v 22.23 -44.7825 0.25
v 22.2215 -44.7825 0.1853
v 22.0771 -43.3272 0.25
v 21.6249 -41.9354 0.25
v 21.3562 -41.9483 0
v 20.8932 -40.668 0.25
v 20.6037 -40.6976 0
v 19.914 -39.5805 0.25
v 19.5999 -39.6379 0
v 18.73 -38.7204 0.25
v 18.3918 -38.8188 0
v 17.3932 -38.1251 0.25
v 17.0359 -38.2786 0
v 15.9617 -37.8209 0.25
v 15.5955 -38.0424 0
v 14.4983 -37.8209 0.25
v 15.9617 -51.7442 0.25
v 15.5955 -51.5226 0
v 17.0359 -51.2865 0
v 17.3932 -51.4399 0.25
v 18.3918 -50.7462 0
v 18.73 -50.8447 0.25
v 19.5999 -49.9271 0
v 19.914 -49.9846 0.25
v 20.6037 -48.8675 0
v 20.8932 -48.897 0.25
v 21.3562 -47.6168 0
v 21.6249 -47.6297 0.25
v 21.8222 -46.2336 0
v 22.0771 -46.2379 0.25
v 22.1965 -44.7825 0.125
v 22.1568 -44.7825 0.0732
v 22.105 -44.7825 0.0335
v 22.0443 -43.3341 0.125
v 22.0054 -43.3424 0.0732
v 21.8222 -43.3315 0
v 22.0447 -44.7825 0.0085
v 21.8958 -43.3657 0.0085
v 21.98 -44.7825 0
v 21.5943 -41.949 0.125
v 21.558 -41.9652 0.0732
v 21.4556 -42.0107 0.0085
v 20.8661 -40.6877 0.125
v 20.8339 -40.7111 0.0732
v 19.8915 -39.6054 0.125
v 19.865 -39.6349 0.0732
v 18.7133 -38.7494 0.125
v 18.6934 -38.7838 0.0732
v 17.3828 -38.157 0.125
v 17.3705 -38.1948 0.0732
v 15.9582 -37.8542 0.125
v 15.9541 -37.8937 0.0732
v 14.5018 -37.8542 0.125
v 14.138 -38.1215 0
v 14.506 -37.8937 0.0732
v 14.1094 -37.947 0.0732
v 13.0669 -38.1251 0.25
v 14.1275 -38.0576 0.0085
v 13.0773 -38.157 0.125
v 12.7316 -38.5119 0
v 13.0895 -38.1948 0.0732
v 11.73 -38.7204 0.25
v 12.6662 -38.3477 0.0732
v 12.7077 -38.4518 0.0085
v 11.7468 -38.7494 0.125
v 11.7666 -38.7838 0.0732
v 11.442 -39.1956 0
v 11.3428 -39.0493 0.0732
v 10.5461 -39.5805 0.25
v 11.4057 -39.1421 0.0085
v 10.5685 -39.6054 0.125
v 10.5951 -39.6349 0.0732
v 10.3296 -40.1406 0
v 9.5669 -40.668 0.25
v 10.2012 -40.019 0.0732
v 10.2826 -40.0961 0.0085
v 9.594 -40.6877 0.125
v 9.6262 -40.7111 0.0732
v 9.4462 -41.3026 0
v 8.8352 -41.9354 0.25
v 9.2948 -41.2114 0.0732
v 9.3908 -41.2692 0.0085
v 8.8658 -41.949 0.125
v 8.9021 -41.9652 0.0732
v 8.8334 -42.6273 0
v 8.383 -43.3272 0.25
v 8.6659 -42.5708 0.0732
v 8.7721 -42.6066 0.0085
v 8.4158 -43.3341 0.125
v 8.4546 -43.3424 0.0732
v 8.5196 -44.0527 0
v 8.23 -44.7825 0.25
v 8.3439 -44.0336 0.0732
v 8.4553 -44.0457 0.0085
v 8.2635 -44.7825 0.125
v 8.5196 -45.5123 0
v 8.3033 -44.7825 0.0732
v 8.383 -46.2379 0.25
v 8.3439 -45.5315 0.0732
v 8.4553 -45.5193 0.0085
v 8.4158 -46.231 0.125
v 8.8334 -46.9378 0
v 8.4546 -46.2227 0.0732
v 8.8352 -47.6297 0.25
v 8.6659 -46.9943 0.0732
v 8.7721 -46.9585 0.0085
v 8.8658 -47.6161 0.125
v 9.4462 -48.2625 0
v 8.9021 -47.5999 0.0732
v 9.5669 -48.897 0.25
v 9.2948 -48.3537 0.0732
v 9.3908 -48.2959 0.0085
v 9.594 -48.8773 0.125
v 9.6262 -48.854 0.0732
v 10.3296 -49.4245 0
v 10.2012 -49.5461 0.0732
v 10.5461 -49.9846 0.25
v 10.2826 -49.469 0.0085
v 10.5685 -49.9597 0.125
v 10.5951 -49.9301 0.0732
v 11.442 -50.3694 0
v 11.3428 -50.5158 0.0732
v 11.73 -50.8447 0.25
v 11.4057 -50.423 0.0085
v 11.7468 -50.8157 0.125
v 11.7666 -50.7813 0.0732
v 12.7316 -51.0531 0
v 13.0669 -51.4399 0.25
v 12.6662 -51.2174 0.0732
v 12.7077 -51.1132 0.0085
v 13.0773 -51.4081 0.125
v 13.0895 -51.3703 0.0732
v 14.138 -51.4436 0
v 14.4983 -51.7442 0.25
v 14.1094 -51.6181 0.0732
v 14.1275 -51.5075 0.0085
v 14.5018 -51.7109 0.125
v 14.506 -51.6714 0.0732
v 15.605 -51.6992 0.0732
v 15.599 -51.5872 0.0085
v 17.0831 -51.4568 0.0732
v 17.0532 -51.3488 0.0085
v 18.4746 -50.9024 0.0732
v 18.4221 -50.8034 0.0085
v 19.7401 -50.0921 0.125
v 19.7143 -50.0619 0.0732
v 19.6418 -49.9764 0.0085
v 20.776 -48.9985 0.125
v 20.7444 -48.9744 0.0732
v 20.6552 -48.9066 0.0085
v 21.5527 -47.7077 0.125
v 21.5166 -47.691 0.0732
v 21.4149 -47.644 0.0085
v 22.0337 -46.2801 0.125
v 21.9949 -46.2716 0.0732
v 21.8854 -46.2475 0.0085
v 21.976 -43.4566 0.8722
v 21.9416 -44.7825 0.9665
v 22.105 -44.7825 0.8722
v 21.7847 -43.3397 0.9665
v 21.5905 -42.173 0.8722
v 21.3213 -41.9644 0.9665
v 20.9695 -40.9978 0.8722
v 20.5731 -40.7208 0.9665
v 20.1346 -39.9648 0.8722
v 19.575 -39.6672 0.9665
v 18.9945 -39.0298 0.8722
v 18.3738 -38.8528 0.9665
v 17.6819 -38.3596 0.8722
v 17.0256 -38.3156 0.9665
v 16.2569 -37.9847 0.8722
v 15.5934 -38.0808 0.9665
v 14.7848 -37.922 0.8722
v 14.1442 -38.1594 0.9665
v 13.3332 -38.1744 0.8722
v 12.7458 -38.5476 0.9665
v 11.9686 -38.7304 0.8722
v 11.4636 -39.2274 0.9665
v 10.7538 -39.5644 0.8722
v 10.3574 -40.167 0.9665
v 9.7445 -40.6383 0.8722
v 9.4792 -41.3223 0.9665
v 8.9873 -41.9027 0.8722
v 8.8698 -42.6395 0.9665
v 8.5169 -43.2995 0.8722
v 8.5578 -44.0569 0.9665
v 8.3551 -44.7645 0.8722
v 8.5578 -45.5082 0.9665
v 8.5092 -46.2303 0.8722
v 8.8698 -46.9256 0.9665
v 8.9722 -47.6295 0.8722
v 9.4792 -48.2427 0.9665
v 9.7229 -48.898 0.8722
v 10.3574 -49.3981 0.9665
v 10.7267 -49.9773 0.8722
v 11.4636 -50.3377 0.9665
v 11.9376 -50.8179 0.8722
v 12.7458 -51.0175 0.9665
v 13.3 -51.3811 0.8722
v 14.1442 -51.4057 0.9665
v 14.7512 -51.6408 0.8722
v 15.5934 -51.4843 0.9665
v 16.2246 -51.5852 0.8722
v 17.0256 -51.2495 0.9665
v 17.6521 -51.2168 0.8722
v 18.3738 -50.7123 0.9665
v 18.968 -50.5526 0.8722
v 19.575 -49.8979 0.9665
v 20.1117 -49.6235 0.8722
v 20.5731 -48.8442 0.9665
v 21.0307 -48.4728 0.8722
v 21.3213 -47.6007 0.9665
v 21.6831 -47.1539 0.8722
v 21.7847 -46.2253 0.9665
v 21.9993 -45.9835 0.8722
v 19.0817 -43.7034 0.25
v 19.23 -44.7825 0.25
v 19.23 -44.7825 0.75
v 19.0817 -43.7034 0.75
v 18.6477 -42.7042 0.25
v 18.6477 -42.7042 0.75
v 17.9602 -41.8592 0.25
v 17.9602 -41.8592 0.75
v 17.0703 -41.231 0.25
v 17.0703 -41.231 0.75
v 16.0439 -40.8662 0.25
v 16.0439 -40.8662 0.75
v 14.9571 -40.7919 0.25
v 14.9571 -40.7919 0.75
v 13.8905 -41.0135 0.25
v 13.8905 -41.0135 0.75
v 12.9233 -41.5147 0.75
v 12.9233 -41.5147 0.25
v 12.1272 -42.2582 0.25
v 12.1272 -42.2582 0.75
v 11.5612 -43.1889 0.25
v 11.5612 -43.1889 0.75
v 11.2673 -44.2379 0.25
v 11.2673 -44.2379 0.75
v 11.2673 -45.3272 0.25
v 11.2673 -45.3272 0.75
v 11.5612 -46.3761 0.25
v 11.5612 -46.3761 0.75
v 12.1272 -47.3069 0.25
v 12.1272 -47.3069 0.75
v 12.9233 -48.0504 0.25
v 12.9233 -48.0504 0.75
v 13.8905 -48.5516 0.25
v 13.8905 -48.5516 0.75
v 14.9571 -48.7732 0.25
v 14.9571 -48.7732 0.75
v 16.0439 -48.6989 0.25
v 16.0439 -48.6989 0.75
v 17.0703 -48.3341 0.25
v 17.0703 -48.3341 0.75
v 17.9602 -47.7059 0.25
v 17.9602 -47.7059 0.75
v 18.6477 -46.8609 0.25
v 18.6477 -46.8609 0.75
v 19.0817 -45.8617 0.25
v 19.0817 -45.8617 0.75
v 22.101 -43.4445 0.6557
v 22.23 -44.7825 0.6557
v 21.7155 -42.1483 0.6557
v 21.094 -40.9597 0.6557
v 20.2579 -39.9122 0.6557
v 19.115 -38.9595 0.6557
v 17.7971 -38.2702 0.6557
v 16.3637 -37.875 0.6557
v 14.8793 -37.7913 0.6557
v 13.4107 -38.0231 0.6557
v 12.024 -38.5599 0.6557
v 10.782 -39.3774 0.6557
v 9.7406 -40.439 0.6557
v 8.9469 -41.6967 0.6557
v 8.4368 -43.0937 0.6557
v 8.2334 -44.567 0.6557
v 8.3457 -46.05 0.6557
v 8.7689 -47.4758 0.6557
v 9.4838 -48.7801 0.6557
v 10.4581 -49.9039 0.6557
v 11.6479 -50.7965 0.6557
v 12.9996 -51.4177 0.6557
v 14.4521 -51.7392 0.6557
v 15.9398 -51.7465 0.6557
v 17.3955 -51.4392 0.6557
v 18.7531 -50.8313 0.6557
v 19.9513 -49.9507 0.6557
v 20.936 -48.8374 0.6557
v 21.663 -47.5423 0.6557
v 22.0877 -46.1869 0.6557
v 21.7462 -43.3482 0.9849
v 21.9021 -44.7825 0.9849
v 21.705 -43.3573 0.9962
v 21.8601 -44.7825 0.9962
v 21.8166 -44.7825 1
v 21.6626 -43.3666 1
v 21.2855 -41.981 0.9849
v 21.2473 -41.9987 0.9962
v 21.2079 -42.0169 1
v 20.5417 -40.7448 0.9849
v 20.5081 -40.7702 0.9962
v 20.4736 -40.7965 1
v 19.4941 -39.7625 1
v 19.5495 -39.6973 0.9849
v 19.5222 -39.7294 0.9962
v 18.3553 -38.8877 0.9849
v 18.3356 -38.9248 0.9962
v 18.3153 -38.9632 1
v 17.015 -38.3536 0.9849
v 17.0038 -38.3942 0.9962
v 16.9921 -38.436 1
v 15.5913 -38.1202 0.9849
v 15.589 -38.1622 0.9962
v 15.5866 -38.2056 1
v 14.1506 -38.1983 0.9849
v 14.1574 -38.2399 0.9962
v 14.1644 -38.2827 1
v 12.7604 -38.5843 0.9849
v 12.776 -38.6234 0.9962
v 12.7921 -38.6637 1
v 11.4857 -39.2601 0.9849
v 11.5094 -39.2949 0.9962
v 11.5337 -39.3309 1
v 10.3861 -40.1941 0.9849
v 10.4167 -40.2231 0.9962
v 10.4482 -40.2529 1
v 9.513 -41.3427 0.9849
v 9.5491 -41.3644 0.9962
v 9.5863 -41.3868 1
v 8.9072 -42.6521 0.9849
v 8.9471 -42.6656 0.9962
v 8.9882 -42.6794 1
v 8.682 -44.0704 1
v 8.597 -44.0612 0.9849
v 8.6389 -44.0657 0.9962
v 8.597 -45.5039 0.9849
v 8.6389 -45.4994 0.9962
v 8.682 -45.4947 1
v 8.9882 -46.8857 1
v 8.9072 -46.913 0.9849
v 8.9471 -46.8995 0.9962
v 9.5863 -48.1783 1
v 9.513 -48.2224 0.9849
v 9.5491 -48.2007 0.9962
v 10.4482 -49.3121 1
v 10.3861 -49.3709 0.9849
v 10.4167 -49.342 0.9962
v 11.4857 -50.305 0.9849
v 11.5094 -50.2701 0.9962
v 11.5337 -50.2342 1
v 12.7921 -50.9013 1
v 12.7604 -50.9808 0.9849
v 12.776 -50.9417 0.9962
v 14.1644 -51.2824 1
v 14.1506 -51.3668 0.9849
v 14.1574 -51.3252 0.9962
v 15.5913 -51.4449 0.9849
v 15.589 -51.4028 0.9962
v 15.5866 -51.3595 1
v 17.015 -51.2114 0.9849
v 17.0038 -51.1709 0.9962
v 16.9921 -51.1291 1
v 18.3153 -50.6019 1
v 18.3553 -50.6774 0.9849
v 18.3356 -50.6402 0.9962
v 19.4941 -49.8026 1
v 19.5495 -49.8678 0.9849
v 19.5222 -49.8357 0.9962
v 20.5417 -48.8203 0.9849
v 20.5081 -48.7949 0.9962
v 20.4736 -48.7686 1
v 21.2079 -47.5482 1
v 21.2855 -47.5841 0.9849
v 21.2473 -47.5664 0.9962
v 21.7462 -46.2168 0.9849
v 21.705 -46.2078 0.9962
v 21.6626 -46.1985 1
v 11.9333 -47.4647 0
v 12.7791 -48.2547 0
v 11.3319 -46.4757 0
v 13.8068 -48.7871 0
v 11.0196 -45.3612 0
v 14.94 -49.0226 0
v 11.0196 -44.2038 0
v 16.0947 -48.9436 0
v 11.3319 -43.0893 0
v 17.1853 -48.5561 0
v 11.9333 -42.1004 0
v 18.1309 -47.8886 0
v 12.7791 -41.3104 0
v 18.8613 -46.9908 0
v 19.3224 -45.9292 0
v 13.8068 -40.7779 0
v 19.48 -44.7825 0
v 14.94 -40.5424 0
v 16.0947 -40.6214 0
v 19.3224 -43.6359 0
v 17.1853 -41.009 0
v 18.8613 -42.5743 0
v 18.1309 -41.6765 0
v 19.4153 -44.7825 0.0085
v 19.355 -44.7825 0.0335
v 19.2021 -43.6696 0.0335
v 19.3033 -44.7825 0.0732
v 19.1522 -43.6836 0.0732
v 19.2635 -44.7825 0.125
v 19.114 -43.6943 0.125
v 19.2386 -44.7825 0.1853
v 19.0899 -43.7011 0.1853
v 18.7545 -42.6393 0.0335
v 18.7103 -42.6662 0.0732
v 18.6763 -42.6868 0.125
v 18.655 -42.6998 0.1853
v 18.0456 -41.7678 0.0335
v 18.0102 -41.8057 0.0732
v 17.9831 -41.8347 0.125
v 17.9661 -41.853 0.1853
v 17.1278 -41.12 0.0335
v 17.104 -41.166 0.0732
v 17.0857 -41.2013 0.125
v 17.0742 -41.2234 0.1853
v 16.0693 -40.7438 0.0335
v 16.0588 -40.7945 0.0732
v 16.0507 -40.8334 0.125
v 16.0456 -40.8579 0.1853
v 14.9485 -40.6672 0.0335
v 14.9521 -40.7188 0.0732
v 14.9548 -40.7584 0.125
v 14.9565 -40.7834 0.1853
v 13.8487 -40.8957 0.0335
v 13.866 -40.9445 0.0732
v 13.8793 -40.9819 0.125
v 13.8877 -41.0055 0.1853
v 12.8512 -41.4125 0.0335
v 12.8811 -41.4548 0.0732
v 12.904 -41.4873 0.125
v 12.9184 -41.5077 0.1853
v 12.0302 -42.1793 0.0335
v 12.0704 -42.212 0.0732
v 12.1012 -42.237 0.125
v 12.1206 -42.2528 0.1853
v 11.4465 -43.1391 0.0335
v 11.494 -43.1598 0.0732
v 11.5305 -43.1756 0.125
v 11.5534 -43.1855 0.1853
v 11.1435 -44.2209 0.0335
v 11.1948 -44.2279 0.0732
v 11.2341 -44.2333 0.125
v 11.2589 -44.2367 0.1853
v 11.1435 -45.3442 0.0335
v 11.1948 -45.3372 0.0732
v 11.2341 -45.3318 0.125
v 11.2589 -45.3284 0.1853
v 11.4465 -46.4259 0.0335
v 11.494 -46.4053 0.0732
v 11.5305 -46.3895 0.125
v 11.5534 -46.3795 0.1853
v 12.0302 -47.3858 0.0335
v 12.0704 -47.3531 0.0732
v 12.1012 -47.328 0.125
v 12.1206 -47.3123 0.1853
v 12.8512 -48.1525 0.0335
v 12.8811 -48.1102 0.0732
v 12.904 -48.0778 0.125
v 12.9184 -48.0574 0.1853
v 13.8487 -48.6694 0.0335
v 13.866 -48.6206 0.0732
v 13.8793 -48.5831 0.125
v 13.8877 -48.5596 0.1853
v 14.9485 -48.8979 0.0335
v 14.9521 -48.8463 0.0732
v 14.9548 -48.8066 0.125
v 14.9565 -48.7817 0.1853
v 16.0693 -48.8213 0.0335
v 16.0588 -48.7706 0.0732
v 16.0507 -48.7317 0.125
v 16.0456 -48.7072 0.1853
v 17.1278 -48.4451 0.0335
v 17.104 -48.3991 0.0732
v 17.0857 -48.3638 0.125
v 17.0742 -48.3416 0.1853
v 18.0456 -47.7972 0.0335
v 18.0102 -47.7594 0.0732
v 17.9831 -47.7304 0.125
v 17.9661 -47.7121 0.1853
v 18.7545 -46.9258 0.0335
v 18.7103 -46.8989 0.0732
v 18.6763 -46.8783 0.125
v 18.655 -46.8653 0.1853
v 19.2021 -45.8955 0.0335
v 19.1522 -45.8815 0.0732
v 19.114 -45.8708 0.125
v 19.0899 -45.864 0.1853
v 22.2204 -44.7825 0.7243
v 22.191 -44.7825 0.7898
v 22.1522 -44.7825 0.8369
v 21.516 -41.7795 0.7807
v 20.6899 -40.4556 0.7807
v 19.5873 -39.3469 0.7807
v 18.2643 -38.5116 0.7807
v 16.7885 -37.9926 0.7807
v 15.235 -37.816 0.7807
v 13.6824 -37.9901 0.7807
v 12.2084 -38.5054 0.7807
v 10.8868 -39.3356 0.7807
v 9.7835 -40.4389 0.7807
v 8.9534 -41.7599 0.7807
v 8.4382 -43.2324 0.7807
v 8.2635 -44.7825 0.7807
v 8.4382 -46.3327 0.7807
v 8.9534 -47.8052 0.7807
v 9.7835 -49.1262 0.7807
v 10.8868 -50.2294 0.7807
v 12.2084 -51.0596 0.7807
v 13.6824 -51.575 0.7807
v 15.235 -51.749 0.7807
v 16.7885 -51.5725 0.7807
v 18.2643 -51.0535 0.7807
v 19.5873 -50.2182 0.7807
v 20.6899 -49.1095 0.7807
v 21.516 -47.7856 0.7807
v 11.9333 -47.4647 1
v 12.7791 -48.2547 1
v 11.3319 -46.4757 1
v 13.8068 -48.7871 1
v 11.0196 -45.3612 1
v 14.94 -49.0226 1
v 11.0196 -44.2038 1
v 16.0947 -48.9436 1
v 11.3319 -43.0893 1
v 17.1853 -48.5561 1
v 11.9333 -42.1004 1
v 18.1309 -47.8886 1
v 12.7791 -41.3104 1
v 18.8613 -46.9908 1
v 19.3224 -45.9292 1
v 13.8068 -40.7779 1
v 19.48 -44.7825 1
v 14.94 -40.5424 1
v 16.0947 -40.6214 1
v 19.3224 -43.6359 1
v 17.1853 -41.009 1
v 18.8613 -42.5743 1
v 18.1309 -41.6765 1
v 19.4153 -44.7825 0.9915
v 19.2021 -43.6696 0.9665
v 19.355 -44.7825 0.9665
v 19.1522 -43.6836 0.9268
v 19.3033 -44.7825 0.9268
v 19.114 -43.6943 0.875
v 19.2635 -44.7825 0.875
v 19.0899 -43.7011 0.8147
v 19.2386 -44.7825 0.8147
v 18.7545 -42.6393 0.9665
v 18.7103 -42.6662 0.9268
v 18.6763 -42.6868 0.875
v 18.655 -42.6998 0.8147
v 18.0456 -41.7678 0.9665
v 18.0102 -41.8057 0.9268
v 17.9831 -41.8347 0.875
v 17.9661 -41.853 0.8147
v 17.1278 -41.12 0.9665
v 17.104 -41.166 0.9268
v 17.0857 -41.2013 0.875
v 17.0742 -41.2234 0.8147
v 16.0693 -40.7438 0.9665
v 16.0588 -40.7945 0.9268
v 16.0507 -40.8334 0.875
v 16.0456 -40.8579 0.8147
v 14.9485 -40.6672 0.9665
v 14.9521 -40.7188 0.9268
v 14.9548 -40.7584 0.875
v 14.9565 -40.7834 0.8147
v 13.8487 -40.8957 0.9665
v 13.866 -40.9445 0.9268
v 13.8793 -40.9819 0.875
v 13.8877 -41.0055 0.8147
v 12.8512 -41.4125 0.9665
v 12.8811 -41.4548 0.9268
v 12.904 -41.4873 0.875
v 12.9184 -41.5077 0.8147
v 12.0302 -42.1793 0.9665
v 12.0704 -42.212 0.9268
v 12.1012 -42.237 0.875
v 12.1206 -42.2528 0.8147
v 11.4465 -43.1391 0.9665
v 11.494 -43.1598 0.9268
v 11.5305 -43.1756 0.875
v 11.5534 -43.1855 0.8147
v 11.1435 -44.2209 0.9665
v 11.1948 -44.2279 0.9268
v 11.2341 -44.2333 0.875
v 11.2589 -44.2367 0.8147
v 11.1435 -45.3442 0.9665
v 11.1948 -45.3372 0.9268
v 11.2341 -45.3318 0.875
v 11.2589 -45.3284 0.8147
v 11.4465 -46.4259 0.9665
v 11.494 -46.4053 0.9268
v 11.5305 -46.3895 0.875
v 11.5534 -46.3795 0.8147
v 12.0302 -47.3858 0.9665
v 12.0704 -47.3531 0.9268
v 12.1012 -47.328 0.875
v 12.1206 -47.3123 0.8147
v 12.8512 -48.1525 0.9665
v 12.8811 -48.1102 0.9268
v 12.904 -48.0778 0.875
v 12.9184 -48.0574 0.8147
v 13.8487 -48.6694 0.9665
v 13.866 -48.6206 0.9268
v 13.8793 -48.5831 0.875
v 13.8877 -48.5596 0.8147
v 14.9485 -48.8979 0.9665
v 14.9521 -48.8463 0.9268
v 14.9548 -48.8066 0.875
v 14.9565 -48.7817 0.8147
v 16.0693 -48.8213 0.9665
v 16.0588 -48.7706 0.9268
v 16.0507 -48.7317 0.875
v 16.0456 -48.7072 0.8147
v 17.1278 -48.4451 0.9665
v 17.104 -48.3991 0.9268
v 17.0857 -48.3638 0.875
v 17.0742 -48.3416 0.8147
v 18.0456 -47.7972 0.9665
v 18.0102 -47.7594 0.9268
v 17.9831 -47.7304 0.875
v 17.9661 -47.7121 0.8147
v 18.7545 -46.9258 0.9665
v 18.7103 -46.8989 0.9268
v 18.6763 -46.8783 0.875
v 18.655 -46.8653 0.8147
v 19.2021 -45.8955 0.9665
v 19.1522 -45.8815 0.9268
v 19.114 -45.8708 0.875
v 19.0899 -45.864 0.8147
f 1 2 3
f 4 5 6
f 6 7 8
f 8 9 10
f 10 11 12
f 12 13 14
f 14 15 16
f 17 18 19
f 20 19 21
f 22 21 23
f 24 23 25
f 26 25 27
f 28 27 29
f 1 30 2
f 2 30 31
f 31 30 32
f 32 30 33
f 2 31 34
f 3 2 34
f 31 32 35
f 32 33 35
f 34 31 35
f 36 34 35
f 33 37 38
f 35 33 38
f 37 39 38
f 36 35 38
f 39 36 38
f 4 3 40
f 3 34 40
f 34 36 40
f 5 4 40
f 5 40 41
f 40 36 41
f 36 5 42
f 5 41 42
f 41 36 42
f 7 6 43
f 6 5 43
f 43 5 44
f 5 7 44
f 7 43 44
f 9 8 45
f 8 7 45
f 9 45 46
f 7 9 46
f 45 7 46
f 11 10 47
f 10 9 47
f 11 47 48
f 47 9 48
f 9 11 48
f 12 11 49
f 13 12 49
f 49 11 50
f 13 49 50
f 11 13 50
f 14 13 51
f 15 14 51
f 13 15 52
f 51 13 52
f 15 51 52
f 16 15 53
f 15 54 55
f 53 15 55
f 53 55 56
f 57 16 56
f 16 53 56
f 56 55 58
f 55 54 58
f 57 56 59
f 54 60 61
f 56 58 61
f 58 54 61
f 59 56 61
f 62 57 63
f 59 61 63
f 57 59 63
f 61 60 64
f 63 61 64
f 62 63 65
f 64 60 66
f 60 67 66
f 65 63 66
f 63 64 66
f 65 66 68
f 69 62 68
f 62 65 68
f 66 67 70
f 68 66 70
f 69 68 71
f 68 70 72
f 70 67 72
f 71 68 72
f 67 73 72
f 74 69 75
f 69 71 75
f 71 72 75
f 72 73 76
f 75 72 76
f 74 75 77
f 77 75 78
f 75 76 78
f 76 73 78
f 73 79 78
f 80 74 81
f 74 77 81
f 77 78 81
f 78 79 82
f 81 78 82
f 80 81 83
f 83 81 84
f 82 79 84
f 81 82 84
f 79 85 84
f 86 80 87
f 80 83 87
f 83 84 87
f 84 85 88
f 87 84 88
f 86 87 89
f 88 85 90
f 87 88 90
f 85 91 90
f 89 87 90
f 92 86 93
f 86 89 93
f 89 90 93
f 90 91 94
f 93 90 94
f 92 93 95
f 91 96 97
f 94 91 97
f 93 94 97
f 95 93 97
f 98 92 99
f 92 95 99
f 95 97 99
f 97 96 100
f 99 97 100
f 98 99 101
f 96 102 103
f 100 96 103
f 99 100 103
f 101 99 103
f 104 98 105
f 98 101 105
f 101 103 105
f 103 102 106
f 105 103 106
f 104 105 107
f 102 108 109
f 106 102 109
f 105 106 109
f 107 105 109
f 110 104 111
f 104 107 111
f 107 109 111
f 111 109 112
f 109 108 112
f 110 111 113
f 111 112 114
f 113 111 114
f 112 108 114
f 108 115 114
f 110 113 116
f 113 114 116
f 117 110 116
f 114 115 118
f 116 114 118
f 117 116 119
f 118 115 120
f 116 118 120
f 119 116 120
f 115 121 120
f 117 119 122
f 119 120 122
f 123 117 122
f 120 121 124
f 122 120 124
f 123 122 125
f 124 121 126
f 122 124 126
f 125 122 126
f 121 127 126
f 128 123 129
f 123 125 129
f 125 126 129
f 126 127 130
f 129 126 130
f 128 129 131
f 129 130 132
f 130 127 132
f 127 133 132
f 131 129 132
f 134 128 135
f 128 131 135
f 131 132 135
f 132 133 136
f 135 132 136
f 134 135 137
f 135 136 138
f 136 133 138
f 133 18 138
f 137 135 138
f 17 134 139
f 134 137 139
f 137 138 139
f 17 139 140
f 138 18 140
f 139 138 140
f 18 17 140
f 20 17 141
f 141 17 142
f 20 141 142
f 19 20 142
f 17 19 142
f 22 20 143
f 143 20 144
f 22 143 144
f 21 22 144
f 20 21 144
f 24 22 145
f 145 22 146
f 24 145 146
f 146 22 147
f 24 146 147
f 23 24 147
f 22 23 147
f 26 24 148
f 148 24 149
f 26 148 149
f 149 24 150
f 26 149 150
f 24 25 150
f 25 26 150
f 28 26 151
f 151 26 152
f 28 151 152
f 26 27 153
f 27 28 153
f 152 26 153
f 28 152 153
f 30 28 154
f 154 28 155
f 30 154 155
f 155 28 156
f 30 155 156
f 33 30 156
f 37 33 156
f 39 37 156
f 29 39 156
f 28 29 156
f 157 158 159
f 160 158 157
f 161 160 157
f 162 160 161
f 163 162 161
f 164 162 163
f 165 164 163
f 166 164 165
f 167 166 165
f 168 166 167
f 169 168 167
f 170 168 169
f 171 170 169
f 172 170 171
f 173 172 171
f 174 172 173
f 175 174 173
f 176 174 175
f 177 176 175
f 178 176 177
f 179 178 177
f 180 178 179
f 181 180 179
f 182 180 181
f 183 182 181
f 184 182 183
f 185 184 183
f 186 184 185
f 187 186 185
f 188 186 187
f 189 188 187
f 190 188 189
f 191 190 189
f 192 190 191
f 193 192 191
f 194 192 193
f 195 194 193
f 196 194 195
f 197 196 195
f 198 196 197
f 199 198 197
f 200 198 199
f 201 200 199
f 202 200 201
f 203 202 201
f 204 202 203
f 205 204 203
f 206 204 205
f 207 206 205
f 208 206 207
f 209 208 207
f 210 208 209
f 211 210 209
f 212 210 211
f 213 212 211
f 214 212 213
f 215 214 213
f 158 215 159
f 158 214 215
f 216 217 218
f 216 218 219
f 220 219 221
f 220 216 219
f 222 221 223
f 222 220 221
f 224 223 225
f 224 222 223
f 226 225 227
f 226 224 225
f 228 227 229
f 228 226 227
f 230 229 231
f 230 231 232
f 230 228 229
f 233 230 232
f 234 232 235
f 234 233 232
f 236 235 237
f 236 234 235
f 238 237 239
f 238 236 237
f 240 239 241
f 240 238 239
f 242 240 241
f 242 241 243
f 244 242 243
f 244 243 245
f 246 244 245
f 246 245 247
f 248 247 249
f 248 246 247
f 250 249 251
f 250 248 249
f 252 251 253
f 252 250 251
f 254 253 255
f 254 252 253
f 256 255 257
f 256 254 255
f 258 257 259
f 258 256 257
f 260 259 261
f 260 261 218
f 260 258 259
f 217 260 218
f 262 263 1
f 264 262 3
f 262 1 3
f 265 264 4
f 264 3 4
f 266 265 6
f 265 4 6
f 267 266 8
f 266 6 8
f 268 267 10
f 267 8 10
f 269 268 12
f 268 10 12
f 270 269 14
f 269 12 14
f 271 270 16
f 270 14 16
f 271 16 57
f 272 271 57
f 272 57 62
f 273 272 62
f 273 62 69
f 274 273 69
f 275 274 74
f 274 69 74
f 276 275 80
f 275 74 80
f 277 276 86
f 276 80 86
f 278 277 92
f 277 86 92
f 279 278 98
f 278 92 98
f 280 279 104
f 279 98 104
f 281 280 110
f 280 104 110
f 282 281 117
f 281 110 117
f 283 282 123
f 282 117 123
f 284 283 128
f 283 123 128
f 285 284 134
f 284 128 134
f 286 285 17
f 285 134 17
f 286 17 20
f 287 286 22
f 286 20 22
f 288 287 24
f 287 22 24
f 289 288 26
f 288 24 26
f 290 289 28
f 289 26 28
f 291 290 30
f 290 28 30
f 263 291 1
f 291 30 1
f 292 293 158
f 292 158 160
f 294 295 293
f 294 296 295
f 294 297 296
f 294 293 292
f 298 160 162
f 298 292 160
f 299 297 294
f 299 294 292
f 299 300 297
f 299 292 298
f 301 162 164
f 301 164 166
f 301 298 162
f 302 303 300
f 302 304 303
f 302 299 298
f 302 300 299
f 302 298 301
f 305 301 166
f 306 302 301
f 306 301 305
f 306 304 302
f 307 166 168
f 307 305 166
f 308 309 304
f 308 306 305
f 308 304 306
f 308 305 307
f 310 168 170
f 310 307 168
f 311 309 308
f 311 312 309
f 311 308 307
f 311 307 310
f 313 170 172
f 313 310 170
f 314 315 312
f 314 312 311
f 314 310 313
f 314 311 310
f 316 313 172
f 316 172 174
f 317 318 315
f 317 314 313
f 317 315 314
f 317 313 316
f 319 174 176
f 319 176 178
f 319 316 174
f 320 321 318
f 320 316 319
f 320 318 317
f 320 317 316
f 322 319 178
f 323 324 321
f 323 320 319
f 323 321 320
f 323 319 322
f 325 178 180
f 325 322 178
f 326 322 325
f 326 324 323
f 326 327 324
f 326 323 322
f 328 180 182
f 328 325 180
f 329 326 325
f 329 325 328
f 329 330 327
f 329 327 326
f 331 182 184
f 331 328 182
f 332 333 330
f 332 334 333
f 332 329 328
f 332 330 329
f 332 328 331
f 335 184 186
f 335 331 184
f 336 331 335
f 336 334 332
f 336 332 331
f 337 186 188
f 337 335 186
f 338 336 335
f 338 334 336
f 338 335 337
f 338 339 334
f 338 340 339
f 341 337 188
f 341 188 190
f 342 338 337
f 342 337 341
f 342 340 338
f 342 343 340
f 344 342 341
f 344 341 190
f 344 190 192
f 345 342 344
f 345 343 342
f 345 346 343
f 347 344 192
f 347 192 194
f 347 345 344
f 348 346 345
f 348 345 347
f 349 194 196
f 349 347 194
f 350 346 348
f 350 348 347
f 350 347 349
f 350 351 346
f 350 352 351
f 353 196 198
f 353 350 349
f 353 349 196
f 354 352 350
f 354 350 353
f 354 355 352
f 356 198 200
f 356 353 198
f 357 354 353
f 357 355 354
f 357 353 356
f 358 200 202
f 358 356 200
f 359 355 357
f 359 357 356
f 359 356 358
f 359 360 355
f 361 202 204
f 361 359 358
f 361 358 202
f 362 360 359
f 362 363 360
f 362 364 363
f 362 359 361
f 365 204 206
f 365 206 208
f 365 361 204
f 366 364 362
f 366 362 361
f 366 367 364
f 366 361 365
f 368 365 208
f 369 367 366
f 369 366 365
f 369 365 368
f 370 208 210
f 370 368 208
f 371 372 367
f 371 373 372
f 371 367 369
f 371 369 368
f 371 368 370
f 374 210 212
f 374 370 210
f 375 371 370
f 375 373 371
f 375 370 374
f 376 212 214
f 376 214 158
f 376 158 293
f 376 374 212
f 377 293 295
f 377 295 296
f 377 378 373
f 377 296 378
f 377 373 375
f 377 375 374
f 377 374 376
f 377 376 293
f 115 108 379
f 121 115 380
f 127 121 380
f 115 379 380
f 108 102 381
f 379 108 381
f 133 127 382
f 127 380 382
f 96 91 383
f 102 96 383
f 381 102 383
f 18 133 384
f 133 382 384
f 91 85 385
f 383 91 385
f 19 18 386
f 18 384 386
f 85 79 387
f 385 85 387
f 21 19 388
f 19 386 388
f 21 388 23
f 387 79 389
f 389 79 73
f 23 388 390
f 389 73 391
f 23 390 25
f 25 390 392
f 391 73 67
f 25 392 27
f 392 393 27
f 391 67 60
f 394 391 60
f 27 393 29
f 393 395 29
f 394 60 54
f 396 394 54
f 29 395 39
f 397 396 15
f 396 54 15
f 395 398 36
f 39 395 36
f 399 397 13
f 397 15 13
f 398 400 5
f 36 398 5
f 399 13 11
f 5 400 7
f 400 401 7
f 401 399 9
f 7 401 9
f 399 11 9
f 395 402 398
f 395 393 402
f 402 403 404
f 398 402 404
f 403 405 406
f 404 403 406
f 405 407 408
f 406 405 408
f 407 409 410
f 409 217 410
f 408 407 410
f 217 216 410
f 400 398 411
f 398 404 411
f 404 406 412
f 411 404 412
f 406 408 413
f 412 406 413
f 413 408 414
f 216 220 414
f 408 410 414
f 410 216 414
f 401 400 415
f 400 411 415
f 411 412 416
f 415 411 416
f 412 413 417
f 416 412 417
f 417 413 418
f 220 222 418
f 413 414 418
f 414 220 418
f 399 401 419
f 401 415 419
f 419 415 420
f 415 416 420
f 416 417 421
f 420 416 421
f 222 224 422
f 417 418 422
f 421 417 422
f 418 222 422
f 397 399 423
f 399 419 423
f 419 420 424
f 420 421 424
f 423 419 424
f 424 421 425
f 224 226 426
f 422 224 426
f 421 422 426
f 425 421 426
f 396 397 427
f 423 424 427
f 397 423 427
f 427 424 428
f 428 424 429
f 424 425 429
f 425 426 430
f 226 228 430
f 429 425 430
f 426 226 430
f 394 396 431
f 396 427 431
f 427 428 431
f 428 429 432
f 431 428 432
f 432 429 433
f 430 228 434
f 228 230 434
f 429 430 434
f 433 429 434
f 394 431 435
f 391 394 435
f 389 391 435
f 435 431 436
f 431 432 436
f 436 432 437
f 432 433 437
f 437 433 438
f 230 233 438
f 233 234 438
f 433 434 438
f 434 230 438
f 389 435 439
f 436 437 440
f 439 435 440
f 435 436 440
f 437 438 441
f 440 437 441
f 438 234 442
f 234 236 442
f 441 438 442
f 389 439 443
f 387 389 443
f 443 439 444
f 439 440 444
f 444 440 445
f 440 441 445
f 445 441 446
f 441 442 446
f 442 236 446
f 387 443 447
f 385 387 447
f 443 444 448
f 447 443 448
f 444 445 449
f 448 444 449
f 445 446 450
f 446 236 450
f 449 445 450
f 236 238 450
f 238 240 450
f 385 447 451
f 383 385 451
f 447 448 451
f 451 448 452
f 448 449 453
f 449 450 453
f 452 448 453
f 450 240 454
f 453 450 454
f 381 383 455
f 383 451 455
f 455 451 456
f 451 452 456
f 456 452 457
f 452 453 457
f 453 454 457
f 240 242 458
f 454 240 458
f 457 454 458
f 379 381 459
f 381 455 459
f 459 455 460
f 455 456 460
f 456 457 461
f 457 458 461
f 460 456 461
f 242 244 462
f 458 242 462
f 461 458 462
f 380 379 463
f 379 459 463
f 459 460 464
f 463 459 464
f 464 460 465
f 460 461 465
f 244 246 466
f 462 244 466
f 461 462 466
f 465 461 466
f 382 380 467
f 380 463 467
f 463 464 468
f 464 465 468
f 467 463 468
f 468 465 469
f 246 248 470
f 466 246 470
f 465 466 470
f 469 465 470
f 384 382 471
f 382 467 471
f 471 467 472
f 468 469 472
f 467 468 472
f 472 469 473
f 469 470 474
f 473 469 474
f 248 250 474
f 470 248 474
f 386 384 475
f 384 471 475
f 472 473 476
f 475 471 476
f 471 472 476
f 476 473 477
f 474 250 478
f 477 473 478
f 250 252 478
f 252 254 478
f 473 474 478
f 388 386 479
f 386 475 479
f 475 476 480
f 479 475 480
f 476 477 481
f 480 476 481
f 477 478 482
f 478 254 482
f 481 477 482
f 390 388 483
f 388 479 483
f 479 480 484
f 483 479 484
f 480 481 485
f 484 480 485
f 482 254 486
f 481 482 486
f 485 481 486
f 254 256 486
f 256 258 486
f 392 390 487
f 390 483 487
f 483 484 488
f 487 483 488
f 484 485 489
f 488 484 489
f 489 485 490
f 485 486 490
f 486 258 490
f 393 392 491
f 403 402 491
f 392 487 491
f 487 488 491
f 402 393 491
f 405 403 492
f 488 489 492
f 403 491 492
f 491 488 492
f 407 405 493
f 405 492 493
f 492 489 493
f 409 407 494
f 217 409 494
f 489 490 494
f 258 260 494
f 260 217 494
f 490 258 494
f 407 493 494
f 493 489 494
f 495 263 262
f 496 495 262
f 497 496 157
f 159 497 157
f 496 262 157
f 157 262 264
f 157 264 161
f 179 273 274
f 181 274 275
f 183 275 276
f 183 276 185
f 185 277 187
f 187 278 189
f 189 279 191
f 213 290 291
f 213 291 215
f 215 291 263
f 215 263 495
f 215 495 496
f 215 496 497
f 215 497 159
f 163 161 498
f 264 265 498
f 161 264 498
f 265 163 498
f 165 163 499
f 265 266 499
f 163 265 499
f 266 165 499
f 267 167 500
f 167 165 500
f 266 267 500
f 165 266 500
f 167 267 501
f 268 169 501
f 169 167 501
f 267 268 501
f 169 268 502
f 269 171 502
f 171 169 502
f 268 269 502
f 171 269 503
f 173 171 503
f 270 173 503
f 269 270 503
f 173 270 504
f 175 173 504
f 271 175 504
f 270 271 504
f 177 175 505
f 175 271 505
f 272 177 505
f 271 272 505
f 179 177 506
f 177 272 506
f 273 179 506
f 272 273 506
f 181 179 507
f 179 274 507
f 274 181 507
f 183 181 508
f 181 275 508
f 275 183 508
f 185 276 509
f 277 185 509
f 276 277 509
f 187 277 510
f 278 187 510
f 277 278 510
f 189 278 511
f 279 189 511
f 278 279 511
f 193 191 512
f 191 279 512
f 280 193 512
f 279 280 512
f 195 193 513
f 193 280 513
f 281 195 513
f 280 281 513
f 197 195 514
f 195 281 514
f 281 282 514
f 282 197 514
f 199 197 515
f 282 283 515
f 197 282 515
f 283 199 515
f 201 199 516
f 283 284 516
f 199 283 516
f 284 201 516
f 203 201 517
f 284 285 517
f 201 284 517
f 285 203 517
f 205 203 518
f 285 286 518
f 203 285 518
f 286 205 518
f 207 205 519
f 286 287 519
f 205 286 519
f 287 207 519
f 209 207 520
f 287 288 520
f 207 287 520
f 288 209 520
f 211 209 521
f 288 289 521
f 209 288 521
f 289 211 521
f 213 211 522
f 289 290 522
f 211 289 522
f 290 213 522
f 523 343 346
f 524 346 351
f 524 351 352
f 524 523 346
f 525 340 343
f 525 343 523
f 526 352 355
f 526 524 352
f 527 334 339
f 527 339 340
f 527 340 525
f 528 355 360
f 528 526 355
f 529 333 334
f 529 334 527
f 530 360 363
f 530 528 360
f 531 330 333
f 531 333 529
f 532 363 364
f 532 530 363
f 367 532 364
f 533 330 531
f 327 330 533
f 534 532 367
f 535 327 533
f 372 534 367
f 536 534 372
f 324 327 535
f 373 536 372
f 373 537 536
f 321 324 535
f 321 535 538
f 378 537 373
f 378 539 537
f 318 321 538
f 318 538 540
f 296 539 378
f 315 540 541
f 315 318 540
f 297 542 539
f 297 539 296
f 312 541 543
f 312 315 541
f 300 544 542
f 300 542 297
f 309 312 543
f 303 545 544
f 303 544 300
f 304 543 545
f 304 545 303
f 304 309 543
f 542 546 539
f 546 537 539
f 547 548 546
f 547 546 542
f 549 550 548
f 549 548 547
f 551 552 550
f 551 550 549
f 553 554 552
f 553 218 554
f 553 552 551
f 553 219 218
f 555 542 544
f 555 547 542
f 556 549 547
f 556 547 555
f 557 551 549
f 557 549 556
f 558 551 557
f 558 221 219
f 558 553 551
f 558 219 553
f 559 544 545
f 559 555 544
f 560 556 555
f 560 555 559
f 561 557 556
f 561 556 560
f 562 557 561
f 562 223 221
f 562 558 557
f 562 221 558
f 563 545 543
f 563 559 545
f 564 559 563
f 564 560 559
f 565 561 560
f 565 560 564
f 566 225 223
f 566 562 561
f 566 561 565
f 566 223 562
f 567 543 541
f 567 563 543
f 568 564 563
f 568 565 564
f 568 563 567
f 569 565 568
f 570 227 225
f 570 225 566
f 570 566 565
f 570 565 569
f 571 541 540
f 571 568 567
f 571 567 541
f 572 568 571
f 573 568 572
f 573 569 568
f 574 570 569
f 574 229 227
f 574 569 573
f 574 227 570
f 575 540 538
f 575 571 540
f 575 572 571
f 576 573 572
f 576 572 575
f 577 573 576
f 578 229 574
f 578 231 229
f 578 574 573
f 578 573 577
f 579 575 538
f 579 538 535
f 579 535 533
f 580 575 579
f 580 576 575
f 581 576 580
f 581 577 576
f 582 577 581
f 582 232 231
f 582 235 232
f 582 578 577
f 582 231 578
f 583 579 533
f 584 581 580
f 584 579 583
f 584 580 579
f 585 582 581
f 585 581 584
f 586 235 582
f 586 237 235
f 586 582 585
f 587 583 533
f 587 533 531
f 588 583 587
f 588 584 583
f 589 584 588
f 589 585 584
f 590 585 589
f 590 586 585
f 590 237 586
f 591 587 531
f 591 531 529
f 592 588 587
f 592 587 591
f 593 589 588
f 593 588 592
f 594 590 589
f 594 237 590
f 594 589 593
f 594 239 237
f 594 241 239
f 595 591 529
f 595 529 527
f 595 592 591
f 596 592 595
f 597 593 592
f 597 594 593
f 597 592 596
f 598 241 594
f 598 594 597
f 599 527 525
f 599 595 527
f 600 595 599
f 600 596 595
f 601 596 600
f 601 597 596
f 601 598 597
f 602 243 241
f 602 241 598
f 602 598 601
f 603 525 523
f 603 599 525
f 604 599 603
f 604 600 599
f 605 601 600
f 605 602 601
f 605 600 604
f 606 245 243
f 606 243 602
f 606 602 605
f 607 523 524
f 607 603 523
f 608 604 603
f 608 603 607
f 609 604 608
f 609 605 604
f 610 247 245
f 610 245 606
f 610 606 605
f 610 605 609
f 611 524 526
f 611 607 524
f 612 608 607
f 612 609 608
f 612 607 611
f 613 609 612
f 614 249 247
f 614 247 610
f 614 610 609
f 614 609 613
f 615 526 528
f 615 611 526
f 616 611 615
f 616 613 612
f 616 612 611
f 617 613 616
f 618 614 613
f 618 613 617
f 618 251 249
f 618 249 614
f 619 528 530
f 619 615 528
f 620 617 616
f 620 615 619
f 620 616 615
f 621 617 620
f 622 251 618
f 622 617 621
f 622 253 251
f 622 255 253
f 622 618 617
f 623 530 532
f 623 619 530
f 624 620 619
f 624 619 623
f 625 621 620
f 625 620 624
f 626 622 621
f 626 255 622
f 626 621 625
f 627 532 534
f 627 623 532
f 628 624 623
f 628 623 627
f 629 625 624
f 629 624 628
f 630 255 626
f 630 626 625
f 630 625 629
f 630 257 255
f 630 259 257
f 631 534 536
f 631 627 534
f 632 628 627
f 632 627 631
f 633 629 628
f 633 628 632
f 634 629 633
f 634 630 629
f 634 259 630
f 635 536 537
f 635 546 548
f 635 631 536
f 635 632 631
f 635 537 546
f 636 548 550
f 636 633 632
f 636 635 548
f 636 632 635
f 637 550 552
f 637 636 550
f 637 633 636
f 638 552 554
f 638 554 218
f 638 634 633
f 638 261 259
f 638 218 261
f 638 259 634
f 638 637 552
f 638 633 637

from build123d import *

# Parameters (mm, degrees)
SKETCH1_R           = 7
SKETCH1_R_2         = 4
BOSS_EXTRUDE1_DEPTH = 1
CHAMFER1_SIZE       = 0.2
CHAMFER1_SIZE2      = 0.346410162
FILLET1_R           = 0.25


with BuildPart() as part:
    # Sketch1 → Boss-Extrude1 (new body)
    with BuildSketch(Plane.XY):
        with Locations((15.2300359, -44.782538686)):
            Circle(SKETCH1_R)
        with Locations((15.2300359, -44.782538686)):
            Circle(SKETCH1_R_2, mode=Mode.SUBTRACT)
    extrude(amount=BOSS_EXTRUDE1_DEPTH)

    # Chamfer1
    chamfer1_edges = [part.edges().sort_by_distance(p)[0] for p in [
        (8.2300359, -44.782538686, 1),
    ]]
    chamfer1_side = [part.faces().sort_by_distance(p)[0] for p in [
        (8.2300359, -44.782538686, 0.5),
    ]]
    chamfer(chamfer1_edges, length=CHAMFER1_SIZE, length2=CHAMFER1_SIZE2, reference=chamfer1_side[0])

    # Fillet1
    fillet1_edges = [part.edges().sort_by_distance(p)[0] for p in [
        (8.2300359, -44.782538686, 0.8),
        (8.2300359, -44.782538686, 0),
        (11.2300359, -44.782538686, 0),
        (11.2300359, -44.782538686, 1),
        (8.576446062, -44.782538686, 1),
    ]]
    fillet(fillet1_edges, radius=FILLET1_R)


solid = part.part
